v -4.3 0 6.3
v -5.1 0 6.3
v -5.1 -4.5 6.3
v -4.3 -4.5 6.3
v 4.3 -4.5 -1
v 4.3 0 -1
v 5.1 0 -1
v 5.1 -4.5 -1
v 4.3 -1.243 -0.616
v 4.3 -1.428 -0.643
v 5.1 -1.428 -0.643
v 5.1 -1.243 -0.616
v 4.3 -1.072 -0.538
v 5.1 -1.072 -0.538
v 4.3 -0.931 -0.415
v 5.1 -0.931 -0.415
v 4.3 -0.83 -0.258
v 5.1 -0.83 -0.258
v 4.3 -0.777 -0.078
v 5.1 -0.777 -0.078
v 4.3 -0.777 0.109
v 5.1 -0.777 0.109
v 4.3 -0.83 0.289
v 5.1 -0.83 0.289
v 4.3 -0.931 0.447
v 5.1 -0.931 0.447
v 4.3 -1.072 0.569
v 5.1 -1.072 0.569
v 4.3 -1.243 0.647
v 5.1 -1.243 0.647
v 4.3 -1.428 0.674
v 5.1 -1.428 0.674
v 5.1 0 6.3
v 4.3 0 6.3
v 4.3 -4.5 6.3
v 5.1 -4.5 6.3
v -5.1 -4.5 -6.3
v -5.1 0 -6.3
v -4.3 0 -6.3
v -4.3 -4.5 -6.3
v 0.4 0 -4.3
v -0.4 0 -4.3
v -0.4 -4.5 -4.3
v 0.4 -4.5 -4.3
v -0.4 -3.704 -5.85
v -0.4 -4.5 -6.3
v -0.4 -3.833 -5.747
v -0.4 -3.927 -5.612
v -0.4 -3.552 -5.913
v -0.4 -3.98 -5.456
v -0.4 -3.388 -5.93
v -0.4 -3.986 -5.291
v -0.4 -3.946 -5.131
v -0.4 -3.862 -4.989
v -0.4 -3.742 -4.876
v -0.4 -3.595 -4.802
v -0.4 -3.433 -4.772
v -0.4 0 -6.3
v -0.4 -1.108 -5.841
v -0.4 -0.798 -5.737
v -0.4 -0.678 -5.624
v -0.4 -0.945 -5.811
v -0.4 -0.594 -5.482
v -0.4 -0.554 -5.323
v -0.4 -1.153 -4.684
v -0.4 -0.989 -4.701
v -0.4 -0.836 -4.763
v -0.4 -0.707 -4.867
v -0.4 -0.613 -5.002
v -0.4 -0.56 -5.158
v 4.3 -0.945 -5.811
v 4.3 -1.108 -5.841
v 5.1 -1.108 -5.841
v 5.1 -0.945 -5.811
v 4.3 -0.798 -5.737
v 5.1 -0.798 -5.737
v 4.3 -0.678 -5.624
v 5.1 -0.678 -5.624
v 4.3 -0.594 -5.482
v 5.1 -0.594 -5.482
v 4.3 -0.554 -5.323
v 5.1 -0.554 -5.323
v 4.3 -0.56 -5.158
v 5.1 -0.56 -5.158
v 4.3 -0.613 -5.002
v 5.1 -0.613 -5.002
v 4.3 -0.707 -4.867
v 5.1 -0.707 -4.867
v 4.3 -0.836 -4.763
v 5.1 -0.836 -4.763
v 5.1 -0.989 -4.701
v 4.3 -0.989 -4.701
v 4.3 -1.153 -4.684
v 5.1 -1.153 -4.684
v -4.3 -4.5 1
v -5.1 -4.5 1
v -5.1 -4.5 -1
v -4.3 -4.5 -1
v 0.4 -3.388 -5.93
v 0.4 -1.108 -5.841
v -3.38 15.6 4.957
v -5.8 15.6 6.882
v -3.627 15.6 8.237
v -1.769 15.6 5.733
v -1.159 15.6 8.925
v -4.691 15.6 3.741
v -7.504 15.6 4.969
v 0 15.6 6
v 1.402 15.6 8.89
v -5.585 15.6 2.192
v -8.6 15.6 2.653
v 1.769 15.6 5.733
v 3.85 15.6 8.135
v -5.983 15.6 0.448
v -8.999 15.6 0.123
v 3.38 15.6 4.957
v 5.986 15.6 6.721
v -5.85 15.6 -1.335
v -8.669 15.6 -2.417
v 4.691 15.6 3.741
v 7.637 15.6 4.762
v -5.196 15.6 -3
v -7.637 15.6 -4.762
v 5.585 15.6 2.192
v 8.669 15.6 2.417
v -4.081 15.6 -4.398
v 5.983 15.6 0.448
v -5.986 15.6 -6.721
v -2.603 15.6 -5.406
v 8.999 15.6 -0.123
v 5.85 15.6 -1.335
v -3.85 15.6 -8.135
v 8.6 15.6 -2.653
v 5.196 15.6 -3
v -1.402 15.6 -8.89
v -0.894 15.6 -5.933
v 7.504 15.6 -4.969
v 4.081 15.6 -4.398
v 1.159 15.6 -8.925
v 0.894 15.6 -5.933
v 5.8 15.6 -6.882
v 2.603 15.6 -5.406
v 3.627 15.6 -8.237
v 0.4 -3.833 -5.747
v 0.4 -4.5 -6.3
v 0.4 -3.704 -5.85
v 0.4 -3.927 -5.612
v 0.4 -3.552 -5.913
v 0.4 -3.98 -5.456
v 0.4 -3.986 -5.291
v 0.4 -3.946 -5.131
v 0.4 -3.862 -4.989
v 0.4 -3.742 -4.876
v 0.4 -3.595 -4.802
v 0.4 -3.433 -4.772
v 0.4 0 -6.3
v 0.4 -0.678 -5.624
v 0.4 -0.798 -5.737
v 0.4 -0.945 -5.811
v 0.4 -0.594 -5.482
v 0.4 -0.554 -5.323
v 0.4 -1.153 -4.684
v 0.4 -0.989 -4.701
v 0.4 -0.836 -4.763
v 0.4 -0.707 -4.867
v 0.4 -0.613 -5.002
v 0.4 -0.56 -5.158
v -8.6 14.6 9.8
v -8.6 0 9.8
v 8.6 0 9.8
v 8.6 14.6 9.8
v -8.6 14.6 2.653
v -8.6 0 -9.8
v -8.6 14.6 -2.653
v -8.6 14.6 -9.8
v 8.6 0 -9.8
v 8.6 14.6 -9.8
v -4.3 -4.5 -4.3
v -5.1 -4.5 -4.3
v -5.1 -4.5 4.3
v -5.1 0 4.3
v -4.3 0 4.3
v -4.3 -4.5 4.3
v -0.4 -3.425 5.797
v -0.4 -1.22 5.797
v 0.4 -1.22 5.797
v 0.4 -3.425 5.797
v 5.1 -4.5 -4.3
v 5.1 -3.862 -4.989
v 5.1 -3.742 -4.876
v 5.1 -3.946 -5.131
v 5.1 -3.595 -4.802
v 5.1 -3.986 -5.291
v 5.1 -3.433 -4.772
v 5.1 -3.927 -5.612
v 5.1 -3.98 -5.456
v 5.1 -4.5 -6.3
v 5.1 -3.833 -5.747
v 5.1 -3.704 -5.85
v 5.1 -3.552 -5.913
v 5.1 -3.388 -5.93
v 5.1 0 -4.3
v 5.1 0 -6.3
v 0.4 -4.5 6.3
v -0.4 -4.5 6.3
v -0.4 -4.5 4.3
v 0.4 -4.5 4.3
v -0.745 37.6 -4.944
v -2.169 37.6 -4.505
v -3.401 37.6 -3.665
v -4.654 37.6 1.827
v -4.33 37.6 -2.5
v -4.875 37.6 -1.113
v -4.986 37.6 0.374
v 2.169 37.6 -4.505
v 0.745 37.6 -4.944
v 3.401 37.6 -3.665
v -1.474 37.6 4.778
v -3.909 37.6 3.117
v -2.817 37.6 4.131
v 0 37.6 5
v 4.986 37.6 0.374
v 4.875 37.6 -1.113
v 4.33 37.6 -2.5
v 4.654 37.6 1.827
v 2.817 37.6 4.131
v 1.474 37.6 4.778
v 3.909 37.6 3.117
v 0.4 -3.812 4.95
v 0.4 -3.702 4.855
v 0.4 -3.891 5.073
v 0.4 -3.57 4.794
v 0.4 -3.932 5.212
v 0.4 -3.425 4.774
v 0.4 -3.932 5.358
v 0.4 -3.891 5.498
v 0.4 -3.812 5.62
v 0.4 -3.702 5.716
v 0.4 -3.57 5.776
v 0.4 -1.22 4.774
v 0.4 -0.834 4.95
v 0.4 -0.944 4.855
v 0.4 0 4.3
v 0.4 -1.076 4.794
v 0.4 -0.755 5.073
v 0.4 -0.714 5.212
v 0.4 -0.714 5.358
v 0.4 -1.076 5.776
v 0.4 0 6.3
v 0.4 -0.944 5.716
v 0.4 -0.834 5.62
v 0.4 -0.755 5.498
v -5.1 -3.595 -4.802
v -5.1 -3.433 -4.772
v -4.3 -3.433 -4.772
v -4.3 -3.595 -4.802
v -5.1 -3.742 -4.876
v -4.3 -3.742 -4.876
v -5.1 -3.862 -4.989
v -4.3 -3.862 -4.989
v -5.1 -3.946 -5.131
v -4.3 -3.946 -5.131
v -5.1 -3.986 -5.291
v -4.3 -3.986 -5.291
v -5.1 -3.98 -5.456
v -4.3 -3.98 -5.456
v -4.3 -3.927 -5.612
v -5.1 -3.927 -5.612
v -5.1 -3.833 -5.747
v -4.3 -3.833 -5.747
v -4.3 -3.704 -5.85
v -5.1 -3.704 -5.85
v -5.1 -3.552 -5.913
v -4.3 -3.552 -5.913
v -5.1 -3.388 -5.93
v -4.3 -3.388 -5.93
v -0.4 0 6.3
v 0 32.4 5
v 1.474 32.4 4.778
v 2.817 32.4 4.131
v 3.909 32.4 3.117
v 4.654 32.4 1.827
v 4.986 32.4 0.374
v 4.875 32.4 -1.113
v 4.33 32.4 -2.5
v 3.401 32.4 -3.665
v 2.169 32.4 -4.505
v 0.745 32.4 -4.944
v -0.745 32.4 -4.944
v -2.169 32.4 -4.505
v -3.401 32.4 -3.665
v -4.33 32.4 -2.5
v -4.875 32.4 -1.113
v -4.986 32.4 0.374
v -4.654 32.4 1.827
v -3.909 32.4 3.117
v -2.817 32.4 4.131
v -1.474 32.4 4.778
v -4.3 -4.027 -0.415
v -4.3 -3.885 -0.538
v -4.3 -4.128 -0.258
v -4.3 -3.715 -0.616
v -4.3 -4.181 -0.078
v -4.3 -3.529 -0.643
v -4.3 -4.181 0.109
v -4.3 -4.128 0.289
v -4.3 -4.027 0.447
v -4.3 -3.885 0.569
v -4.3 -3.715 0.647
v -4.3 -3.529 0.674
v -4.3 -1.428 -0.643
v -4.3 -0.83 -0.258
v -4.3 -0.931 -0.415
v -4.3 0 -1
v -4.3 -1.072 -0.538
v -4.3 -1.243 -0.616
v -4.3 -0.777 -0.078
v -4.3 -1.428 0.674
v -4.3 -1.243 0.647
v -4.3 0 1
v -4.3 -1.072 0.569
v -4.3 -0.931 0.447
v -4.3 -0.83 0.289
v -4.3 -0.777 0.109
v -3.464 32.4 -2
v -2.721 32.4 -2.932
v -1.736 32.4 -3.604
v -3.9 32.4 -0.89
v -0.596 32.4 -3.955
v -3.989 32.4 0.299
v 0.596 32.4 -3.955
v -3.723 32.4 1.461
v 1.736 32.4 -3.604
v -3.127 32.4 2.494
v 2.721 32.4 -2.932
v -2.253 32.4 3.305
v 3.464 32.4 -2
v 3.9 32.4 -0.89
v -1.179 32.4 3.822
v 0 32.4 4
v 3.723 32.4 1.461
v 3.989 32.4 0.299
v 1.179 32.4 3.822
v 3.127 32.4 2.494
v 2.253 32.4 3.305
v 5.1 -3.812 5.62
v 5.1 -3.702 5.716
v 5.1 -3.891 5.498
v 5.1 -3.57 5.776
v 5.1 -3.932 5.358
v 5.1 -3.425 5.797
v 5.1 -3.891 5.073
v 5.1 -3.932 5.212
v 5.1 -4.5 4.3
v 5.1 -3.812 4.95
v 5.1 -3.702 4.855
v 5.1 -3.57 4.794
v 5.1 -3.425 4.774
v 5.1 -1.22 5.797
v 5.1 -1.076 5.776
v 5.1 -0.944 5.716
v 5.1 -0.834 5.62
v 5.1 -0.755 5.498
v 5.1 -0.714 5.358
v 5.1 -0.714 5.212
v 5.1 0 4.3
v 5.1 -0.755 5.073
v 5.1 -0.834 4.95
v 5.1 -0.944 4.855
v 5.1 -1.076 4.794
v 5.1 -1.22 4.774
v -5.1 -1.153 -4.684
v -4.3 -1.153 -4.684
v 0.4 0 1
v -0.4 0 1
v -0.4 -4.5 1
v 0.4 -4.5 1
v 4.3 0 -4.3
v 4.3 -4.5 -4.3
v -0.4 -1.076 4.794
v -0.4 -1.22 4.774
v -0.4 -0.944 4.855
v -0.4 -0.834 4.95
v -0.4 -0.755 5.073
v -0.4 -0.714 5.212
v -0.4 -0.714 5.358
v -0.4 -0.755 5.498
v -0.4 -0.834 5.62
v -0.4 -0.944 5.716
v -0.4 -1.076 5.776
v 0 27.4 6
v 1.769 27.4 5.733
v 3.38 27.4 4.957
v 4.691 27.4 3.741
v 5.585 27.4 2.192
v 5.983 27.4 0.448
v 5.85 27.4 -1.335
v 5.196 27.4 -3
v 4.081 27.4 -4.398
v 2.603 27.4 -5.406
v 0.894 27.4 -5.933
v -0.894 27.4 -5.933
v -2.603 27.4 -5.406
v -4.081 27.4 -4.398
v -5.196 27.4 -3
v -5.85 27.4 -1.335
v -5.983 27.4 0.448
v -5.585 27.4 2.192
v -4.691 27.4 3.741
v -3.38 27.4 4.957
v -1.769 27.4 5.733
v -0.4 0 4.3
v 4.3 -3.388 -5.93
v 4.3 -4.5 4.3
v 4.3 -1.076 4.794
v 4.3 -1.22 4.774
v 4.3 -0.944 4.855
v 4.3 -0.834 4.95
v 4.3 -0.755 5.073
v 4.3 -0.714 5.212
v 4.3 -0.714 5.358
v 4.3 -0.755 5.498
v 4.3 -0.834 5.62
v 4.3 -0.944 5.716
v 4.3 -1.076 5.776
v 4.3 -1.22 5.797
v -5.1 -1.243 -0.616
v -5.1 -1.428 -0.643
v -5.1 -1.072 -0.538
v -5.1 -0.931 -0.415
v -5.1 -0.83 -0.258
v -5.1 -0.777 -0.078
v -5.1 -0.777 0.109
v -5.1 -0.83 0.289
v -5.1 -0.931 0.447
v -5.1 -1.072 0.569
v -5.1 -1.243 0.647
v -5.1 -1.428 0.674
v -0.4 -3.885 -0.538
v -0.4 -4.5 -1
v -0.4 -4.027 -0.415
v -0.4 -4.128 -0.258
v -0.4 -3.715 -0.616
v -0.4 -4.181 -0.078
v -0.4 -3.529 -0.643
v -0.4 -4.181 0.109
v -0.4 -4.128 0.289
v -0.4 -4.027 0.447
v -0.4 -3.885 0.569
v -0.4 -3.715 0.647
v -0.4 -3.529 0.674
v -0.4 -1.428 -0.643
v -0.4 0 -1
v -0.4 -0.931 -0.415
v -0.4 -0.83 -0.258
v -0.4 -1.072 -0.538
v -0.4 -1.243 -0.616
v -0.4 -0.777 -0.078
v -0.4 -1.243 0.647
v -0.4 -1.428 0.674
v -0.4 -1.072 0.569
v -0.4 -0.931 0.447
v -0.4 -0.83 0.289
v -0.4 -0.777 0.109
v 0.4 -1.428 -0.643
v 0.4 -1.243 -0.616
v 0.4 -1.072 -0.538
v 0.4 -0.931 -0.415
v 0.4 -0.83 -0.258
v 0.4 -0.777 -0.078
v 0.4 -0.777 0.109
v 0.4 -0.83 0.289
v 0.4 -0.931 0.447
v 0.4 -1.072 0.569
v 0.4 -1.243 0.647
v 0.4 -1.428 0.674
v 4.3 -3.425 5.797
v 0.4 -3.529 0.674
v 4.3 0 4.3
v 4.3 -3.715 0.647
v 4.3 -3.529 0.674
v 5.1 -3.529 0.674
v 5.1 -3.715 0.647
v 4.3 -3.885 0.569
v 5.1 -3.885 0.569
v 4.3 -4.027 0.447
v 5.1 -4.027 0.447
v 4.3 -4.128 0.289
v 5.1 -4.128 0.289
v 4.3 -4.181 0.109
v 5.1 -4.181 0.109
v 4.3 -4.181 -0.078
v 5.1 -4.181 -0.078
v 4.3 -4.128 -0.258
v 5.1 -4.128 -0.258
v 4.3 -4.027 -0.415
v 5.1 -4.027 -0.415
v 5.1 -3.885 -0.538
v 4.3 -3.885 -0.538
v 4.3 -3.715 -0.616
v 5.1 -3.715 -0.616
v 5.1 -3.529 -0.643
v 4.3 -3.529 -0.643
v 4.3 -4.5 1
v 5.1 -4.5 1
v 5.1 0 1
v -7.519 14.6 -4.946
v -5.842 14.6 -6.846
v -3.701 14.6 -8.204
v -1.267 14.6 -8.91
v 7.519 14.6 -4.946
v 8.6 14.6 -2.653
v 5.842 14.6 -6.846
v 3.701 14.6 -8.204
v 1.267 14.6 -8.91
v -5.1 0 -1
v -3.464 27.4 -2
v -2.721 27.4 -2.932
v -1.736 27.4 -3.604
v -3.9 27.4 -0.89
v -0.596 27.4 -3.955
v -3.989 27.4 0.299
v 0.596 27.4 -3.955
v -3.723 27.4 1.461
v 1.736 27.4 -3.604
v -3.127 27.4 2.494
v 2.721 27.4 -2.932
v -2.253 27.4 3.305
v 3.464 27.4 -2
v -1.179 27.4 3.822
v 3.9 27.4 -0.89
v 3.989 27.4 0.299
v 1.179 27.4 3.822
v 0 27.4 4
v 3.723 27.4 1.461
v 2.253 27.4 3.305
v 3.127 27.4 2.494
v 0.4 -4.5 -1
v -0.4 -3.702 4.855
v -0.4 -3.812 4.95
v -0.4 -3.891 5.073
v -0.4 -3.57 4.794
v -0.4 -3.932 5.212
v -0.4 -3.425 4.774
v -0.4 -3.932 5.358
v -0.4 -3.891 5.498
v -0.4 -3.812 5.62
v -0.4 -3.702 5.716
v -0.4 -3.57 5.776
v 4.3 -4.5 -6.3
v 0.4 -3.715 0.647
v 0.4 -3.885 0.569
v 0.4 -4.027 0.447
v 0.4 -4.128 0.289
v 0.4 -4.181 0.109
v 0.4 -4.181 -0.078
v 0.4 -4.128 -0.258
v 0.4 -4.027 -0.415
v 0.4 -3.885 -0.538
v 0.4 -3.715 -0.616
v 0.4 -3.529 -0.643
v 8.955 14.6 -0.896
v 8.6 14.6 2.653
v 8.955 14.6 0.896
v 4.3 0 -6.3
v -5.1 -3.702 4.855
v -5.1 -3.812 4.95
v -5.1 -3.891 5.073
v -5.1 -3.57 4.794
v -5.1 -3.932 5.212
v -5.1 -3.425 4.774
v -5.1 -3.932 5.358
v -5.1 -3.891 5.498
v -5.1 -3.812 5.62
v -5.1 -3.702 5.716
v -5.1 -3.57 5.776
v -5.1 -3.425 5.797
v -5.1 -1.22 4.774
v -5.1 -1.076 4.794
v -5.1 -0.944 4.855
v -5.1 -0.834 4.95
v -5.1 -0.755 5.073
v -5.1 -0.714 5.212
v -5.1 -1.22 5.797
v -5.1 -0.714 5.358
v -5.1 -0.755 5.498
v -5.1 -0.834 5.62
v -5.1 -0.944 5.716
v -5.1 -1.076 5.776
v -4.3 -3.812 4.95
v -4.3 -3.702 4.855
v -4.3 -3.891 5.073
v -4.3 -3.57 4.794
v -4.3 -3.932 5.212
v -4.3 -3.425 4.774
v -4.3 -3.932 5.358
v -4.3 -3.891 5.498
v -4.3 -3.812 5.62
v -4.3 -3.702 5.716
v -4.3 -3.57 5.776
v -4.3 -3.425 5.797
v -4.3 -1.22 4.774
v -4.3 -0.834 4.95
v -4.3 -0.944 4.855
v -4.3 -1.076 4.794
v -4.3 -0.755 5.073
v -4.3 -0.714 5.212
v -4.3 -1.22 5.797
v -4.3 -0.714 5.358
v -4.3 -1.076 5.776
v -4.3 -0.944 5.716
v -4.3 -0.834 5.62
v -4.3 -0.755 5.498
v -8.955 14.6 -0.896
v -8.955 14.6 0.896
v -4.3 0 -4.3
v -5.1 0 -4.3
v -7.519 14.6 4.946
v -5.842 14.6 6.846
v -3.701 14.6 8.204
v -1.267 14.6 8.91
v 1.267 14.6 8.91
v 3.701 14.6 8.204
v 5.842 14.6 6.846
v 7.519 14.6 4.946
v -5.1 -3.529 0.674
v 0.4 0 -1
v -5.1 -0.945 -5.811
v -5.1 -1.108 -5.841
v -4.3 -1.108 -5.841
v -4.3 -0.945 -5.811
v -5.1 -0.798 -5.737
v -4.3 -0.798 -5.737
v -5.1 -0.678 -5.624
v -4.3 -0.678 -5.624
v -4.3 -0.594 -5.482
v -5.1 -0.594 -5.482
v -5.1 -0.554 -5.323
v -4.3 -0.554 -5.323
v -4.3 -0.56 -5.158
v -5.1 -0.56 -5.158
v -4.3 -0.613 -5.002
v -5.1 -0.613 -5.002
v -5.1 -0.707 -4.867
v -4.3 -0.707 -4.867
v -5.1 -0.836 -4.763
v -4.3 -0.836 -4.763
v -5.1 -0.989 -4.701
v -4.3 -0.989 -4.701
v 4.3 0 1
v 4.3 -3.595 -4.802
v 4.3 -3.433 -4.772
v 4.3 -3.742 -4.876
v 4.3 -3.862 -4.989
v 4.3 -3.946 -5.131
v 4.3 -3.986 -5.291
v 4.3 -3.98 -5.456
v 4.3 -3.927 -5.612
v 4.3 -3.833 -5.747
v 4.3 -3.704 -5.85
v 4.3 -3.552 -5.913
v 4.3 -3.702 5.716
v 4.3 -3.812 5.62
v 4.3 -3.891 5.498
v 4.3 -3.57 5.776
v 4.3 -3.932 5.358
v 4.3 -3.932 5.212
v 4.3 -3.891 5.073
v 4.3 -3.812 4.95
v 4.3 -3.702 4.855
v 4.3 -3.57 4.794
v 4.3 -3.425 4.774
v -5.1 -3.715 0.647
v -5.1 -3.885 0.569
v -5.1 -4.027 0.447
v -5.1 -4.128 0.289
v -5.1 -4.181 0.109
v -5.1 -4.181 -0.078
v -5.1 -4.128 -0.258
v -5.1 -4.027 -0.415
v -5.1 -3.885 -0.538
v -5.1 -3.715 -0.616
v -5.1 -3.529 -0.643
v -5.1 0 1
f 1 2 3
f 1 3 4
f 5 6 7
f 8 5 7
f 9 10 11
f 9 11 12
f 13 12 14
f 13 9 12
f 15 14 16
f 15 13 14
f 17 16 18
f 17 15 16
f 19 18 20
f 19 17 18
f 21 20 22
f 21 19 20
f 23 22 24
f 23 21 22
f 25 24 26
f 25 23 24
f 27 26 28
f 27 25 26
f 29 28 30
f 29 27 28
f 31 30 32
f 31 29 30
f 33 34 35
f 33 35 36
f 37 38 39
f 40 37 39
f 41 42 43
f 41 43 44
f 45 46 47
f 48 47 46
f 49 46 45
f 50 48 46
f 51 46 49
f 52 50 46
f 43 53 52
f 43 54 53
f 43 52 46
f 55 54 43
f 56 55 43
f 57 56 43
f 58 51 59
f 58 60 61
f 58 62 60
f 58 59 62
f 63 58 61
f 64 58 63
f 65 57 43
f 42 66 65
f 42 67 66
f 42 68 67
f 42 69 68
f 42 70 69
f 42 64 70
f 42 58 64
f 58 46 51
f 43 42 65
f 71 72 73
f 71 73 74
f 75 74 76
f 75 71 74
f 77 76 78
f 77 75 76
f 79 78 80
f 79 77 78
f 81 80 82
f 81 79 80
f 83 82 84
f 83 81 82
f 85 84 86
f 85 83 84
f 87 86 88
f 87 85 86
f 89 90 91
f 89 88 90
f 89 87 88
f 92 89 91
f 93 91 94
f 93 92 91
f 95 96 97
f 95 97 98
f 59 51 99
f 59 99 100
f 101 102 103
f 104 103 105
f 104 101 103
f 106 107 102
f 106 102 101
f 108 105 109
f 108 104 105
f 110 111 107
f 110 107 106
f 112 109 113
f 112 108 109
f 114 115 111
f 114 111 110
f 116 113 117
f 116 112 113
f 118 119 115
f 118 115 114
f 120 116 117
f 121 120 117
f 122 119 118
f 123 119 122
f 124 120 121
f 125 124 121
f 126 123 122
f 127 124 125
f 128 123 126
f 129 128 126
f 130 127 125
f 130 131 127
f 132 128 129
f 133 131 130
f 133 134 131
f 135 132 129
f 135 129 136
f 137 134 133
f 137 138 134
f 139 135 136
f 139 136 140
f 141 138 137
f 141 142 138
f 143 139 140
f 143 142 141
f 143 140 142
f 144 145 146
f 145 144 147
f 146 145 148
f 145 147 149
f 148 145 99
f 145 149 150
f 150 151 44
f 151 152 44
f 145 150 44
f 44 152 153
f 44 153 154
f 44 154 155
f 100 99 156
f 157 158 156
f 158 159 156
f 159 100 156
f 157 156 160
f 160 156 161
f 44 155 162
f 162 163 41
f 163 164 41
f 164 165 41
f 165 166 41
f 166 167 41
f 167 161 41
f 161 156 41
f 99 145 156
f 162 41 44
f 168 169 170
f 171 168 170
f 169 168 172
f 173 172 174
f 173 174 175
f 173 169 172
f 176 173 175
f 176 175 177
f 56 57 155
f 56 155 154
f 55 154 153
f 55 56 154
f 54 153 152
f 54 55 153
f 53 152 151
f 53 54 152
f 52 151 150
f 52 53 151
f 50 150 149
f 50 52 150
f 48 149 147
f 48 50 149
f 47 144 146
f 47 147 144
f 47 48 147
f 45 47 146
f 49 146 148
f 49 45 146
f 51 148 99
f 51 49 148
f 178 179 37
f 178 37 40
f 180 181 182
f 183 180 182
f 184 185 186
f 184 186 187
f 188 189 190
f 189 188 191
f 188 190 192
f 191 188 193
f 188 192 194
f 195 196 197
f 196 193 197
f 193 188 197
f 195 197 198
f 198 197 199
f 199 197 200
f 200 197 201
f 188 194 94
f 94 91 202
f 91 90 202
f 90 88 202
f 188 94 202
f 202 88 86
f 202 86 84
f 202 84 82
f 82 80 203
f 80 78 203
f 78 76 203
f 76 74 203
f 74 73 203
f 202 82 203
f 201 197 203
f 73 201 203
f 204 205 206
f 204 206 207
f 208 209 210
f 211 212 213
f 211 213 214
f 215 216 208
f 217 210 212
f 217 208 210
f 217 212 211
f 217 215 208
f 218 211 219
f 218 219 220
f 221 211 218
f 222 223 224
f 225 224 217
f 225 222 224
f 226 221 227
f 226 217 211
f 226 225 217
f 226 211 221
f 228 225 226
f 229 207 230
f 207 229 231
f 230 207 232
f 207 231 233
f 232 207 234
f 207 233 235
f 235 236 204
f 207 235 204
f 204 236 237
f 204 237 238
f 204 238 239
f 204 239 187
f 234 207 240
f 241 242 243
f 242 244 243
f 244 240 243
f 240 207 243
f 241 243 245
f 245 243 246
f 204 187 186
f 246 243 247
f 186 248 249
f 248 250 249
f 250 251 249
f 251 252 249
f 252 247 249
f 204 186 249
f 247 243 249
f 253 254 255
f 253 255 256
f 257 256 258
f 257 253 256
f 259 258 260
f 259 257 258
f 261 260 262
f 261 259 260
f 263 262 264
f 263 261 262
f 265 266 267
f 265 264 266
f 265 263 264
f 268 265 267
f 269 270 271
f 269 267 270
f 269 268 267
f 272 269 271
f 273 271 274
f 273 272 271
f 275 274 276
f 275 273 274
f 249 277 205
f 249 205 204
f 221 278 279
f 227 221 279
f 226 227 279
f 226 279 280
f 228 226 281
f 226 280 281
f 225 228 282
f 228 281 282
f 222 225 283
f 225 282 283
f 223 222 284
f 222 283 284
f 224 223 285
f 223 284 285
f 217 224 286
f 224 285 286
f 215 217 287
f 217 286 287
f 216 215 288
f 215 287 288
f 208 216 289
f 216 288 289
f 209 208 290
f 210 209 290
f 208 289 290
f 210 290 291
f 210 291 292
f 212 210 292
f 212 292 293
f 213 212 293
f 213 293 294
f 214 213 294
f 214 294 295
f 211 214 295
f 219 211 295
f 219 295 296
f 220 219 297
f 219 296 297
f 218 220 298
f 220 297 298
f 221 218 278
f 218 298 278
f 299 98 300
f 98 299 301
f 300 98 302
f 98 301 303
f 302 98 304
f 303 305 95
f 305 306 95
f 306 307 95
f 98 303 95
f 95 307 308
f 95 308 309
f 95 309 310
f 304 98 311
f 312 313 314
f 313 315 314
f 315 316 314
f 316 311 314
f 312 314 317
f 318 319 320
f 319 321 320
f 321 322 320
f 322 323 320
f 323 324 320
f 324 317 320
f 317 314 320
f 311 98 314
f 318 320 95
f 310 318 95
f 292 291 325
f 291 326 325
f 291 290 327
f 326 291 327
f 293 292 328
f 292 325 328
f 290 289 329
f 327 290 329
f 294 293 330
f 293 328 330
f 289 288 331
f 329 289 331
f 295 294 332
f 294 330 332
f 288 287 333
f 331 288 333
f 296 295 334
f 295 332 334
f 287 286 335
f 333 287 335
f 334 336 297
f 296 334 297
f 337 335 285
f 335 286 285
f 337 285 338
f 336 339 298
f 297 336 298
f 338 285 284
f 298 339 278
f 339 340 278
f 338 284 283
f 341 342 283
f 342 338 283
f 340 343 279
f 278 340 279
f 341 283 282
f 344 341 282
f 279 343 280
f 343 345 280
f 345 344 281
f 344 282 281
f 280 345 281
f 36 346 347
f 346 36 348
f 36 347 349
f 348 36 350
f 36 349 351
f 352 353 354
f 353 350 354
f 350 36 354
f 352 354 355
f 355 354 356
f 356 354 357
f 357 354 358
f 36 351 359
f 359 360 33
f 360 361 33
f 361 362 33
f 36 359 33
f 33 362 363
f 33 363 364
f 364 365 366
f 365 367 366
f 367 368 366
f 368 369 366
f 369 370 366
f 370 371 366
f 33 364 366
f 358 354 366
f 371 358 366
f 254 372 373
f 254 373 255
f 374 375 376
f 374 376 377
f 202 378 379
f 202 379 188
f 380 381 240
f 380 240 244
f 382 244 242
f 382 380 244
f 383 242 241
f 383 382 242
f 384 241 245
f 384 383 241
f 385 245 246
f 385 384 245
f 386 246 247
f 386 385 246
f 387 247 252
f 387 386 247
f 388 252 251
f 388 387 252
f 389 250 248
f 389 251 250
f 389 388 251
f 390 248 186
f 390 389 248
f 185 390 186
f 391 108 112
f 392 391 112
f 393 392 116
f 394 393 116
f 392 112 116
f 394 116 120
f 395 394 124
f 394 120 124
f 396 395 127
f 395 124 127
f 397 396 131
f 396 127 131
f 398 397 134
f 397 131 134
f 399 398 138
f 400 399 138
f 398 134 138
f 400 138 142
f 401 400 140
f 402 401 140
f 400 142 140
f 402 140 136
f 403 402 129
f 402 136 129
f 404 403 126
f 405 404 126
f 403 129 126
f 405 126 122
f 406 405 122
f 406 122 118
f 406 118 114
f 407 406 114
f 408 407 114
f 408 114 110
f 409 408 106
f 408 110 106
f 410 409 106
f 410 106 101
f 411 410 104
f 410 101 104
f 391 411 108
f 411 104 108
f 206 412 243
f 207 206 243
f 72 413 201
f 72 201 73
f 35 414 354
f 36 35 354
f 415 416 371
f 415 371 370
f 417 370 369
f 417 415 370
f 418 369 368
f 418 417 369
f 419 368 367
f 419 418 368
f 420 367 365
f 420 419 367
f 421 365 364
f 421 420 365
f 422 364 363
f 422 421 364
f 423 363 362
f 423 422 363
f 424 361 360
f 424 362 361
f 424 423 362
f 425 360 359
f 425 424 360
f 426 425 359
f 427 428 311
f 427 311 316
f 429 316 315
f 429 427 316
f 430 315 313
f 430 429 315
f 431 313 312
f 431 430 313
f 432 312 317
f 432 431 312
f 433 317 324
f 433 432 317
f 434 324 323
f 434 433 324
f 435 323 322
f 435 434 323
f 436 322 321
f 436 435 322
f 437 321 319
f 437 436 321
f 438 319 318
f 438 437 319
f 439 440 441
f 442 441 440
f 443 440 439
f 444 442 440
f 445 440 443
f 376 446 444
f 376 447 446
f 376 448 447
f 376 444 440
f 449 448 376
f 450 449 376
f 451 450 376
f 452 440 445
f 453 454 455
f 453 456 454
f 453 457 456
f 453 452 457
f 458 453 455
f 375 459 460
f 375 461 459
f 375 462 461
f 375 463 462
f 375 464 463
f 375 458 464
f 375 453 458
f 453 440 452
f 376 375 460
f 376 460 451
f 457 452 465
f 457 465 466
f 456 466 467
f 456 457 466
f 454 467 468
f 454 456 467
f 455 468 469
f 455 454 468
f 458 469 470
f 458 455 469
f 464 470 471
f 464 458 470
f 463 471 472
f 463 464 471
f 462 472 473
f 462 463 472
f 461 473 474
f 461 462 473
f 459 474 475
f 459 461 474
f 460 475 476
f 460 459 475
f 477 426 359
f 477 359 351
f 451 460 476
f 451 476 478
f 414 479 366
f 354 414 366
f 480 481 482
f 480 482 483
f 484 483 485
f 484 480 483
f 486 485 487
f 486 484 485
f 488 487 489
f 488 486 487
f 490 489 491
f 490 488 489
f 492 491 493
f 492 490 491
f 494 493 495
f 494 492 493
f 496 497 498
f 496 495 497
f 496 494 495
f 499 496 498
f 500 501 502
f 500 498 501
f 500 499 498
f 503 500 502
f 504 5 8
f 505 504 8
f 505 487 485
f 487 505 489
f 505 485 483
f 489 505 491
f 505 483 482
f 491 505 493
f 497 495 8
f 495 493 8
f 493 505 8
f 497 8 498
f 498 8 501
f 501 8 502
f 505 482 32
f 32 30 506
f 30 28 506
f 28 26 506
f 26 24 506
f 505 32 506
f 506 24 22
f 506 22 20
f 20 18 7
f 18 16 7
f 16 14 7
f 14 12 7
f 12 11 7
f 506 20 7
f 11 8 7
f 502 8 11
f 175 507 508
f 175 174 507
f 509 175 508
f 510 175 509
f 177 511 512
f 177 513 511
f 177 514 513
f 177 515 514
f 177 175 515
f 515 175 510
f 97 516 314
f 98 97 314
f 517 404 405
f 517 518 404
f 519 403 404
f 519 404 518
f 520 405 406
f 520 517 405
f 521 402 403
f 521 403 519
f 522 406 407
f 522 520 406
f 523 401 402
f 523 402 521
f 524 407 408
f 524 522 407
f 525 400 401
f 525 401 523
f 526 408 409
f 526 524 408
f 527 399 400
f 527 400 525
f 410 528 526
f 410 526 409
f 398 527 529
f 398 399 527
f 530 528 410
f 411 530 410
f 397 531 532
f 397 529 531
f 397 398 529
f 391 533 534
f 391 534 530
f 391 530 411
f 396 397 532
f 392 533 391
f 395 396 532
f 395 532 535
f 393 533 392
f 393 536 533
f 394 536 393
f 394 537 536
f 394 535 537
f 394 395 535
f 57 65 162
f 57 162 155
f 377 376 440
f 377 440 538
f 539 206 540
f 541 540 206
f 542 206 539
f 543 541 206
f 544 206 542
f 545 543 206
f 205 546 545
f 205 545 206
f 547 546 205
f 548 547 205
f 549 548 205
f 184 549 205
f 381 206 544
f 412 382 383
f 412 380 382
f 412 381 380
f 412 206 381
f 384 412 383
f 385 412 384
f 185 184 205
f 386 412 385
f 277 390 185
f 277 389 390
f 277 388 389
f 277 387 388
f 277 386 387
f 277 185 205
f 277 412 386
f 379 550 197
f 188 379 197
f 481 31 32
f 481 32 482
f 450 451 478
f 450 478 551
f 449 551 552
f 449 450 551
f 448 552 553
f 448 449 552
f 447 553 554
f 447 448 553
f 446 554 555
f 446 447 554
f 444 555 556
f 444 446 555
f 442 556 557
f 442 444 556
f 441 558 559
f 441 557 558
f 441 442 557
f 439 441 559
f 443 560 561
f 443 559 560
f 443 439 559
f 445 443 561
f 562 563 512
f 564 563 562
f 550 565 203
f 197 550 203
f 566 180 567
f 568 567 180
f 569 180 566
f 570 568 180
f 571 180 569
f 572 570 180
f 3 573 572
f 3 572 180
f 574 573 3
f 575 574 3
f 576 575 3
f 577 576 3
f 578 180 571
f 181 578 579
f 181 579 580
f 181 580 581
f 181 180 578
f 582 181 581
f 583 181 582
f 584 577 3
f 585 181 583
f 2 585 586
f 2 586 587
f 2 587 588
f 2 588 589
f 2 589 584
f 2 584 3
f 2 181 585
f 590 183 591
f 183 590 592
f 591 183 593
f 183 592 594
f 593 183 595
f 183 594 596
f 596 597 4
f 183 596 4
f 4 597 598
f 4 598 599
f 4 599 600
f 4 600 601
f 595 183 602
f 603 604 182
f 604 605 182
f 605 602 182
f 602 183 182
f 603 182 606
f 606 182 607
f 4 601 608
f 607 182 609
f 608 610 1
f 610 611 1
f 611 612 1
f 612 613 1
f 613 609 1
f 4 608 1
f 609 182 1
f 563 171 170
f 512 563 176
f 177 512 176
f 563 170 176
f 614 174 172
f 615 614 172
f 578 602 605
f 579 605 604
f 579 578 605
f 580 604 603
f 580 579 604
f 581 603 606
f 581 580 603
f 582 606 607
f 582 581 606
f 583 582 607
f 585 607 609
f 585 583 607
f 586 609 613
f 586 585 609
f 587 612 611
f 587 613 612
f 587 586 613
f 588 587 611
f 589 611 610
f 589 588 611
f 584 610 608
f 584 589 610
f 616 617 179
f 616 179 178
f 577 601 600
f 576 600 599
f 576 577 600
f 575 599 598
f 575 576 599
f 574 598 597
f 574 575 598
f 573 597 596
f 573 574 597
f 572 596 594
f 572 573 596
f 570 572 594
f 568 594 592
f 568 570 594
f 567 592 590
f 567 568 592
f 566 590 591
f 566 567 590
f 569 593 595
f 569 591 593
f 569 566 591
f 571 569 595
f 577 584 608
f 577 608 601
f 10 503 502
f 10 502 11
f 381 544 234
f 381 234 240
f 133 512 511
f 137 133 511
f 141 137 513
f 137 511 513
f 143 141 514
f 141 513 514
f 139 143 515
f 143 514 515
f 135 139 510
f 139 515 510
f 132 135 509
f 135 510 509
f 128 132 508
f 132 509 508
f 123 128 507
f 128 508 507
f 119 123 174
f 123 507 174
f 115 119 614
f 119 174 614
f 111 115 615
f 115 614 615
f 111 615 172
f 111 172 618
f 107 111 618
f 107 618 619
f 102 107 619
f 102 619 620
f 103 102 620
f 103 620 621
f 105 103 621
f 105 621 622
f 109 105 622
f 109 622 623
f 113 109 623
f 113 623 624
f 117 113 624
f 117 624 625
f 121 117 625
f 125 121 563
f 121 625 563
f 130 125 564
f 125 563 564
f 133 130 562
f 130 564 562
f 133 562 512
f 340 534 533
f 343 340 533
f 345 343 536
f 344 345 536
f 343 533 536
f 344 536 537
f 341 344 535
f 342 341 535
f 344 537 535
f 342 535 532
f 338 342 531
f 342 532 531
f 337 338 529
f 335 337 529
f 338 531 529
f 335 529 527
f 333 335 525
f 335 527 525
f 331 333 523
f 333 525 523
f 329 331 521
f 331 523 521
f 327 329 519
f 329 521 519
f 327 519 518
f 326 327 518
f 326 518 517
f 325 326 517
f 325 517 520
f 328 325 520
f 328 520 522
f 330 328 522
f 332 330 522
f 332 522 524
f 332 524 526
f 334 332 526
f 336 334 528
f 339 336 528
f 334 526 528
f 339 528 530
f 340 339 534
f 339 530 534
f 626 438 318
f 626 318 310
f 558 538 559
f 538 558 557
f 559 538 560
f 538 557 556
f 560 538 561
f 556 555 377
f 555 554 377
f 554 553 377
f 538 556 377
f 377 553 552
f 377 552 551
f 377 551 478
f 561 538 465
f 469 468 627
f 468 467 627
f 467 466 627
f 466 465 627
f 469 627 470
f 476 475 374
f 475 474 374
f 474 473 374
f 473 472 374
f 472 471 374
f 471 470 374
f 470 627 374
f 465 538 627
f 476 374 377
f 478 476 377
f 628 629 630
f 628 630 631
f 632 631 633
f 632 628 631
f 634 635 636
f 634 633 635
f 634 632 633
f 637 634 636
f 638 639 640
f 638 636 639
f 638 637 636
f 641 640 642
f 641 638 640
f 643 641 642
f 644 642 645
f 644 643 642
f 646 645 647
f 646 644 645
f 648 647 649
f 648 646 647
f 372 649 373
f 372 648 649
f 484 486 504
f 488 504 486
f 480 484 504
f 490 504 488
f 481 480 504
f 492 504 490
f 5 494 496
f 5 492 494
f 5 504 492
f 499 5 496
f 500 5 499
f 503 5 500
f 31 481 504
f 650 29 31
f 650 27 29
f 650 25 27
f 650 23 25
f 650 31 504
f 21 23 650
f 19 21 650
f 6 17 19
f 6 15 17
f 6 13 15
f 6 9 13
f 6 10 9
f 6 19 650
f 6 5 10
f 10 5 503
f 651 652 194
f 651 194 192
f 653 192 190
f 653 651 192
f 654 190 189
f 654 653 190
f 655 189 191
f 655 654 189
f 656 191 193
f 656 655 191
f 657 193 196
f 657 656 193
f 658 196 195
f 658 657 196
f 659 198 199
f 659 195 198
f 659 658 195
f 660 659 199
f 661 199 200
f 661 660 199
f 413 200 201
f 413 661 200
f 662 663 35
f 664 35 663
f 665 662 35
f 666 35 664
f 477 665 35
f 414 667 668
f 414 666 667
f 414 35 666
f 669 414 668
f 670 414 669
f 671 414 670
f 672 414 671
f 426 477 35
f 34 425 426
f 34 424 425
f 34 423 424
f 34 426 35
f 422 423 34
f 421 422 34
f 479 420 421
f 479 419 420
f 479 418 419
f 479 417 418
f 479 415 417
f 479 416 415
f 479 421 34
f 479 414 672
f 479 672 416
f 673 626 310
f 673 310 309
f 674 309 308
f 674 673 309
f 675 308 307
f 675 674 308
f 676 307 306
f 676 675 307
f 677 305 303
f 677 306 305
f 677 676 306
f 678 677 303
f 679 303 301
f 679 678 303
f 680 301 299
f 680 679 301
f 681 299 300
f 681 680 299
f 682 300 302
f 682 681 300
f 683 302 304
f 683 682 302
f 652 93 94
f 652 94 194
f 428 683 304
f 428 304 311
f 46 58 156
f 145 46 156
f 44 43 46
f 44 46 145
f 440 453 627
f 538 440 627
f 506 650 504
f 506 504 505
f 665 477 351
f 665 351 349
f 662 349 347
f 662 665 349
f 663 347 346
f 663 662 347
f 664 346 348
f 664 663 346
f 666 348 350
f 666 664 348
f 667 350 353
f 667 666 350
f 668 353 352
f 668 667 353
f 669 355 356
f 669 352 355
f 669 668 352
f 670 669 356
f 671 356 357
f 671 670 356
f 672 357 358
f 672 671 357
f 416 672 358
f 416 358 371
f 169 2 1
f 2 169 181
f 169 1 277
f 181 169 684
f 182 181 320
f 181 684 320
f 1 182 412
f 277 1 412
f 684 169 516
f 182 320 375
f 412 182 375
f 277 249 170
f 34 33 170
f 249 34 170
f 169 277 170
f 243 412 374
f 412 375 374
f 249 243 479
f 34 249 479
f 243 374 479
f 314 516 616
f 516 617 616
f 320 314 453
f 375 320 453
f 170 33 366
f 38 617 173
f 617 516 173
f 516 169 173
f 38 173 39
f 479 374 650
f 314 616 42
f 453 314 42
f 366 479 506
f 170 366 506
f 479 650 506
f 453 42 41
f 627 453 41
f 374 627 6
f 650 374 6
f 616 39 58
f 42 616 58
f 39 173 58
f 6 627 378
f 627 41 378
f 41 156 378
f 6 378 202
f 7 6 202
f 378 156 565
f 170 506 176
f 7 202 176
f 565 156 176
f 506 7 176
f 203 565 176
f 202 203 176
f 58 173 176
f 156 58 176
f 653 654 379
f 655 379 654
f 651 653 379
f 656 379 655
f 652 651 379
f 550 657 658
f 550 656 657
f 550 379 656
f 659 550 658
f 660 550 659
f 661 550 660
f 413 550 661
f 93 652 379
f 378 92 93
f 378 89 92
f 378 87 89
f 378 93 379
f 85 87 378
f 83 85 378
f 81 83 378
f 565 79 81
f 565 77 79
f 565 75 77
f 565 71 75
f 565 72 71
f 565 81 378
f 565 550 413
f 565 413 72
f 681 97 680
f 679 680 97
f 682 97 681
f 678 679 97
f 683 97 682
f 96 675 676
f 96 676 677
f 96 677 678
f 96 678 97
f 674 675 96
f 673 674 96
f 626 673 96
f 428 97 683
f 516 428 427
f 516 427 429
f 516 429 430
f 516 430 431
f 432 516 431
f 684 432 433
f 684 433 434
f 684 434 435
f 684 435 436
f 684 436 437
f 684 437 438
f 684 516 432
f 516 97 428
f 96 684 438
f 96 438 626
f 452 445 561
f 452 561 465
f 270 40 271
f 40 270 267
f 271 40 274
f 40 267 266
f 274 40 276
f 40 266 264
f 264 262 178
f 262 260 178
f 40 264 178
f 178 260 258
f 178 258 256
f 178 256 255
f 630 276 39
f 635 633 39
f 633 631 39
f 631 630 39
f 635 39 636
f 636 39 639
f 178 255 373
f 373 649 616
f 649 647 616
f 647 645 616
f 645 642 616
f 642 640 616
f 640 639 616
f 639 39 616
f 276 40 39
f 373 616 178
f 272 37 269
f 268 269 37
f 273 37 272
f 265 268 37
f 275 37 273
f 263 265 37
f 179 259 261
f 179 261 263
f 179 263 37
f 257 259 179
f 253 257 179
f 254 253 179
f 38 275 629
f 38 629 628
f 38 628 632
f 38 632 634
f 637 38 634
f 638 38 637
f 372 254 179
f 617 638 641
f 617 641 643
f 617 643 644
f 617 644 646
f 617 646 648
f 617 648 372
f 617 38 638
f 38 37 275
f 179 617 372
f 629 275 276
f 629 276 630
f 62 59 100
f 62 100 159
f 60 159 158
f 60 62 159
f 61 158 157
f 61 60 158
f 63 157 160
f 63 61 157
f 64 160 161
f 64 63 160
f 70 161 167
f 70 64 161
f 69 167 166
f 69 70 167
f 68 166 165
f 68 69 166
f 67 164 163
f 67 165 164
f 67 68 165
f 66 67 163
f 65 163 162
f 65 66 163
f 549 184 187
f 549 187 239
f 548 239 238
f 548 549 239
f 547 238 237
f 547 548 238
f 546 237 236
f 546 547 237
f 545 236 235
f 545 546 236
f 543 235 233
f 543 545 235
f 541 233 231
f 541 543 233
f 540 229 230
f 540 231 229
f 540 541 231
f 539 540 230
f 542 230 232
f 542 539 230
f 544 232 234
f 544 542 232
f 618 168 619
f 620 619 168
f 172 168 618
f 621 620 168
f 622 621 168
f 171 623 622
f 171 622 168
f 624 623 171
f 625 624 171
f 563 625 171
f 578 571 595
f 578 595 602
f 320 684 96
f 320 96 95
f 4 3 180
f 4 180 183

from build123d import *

# Parameters (mm, degrees)
SKETCH_1_W                       = 17.2
SKETCH_1_H                       = 19.6
EXTRUDE_1_DEPTH                  = 14.6
SKETCH_2_R                       = 9
EXTRUDE_2_DEPTH                  = 1
SKETCH_3_R                       = 6
EXTRUDE_3_DEPTH                  = 11.8
SKETCH_4_R                       = 4
EXTRUDE_4_DEPTH                  = 5
SKETCH_5_R                       = 5
EXTRUDE_5_DEPTH                  = 5.2
SKETCH_6_W                       = 0.8
SKETCH_6_H                       = 2
EXTRUDE_6_DEPTH                  = 4.5
PATTERN_LINEAR_1_COUNT           = 2
PATTERN_LINEAR_1_PITCH           = 5.3
PATTERN_LINEAR_2_COUNT           = 2
PATTERN_LINEAR_2_PITCH           = 4.7
PATTERN_LINEAR_2_COPY_1_SKETCH_W = 0.8
PATTERN_LINEAR_2_COPY_1_SKETCH_H = 2
PATTERN_LINEAR_2_COPY_1_DEPTH    = 4.5
PATTERN_LINEAR_3_COUNT           = 2
PATTERN_LINEAR_3_PITCH           = 5.3
PATTERN_LINEAR_3_COPY_1_SKETCH_W = 0.8
PATTERN_LINEAR_3_COPY_1_SKETCH_H = 2
PATTERN_LINEAR_3_COPY_1_DEPTH    = 4.5
PATTERN_LINEAR_3_COPY_2_SKETCH_W = 0.8
PATTERN_LINEAR_3_COPY_2_SKETCH_H = 2
PATTERN_LINEAR_3_COPY_2_DEPTH    = 4.5
PATTERN_LINEAR_3_COPY_3_SKETCH_W = 0.8
PATTERN_LINEAR_3_COPY_3_SKETCH_H = 2
PATTERN_LINEAR_3_COPY_3_DEPTH    = 4.5
PATTERN_START                    = -6.3
PATTERN_LINEAR_4_OUTLINE_W       = 0.8
PATTERN_LINEAR_4_OUTLINE_H       = 4.5
PATTERN_LINEAR_4_DEPTH           = 2
PATTERN_START_2                  = -1
PATTERN_LINEAR_4_2_OUTLINE_W     = 0.8
PATTERN_LINEAR_4_2_OUTLINE_H     = 4.5
PATTERN_LINEAR_4_2_DEPTH         = 2
PATTERN_START_3                  = 4.3
PATTERN_LINEAR_4_3_OUTLINE_W     = 0.8
PATTERN_LINEAR_4_3_OUTLINE_H     = 4.5
PATTERN_LINEAR_4_3_DEPTH         = 2
CUT_EXTRUDE_1_DEPTH              = 42.335335973


# Read off the part's stored shape, not the designer's step: 阵列(线性)4
with BuildPart() as part:
    # 草图1 → 凸台-拉伸1 (new body)
    with BuildSketch(Plane(origin=(0, 0, 0), x_dir=(1, 0, 0), z_dir=(0, 1, 0))):
        Rectangle(SKETCH_1_W, SKETCH_1_H)
    extrude(amount=EXTRUDE_1_DEPTH)

    # 草图2 → 凸台-拉伸2 (add)
    with BuildSketch(Plane(origin=(0, 14.6, 0), x_dir=(1, 0, 0), z_dir=(0, 1, 0))):
        with Locations(Location((0, 0, 0), (0, 0, 17.146209999))):
            Circle(SKETCH_2_R)
    extrude(amount=EXTRUDE_2_DEPTH)

    # 草图3 → 凸台-拉伸3 (add)
    with BuildSketch(Plane(origin=(0, 15.6, 0), x_dir=(1, 0, 0), z_dir=(0, 1, 0))):
        with Locations(Location((0, 0, 0), (0, 0, 270))):
            Circle(SKETCH_3_R)
    extrude(amount=EXTRUDE_3_DEPTH)

    # 草图4 → 凸台-拉伸4 (add)
    with BuildSketch(Plane(origin=(0, 27.4, 0), x_dir=(1, 0, 0), z_dir=(0, 1, 0))):
        with Locations(Location((0, 0, 0), (0, 0, 270))):
            Circle(SKETCH_4_R)
    extrude(amount=EXTRUDE_4_DEPTH)

    # 草图5 → 凸台-拉伸5 (add)
    with BuildSketch(Plane(origin=(0, 32.4, 0), x_dir=(1, 0, 0), z_dir=(0, 1, 0))):
        with Locations(Location((0, 0, 0), (0, 0, 270))):
            Circle(SKETCH_5_R)
    extrude(amount=EXTRUDE_5_DEPTH)

    # 草图6 → 凸台-拉伸6 (add)
    with BuildSketch(Plane.XZ):
        Rectangle(SKETCH_6_W, SKETCH_6_H)
    extrude_6 = extrude(amount=EXTRUDE_6_DEPTH)

    # 阵列(线性)1: 凸台-拉伸6 ×2
    with Locations(*[(0, 0, i * PATTERN_LINEAR_1_PITCH) for i in range(1, PATTERN_LINEAR_1_COUNT)]):
        add(extrude_6)

    # 阵列(线性)2: 凸台-拉伸6 ×2
    with Locations(*[(-i * PATTERN_LINEAR_2_PITCH, 0, 0) for i in range(1, PATTERN_LINEAR_2_COUNT)]):
        add(extrude_6)

    # 阵列(线性)2 copy 1 sketch → 阵列(线性)2 copy 1 (add)
    with BuildSketch(Plane(origin=(-4.7, 0, 5.3), x_dir=(1, 0, 0), z_dir=(0, -1, 0))):
        Rectangle(PATTERN_LINEAR_2_COPY_1_SKETCH_W, PATTERN_LINEAR_2_COPY_1_SKETCH_H)
    extrude(amount=PATTERN_LINEAR_2_COPY_1_DEPTH)

    # 阵列(线性)3: 凸台-拉伸6 ×2
    with Locations(*[(0, 0, -i * PATTERN_LINEAR_3_PITCH) for i in range(1, PATTERN_LINEAR_3_COUNT)]):
        add(extrude_6)

    # 阵列(线性)3 copy 1 sketch → 阵列(线性)3 copy 1 (add)
    with BuildSketch(Plane.XZ):
        Rectangle(PATTERN_LINEAR_3_COPY_1_SKETCH_W, PATTERN_LINEAR_3_COPY_1_SKETCH_H)
    extrude(amount=PATTERN_LINEAR_3_COPY_1_DEPTH)

    # 阵列(线性)3 copy 2 sketch → 阵列(线性)3 copy 2 (add)
    with BuildSketch(Plane(origin=(-4.7, 0, -5.3), x_dir=(1, 0, 0), z_dir=(0, -1, 0))):
        Rectangle(PATTERN_LINEAR_3_COPY_2_SKETCH_W, PATTERN_LINEAR_3_COPY_2_SKETCH_H)
    extrude(amount=PATTERN_LINEAR_3_COPY_2_DEPTH)

    # 阵列(线性)3 copy 3 sketch → 阵列(线性)3 copy 3 (add)
    with BuildSketch(Plane(origin=(-4.7, 0, 0), x_dir=(1, 0, 0), z_dir=(0, -1, 0))):
        Rectangle(PATTERN_LINEAR_3_COPY_3_SKETCH_W, PATTERN_LINEAR_3_COPY_3_SKETCH_H)
    extrude(amount=PATTERN_LINEAR_3_COPY_3_DEPTH)

    # 阵列(线性)4 outline → 阵列(线性)4 (add)
    with BuildSketch(Plane.XY.offset(PATTERN_START)):
        with Locations((4.7, -2.25)):
            Rectangle(PATTERN_LINEAR_4_OUTLINE_W, PATTERN_LINEAR_4_OUTLINE_H)
    extrude(amount=PATTERN_LINEAR_4_DEPTH)

    # Pattern Linear 4 2 outline → Pattern Linear 4 2 (add)
    with BuildSketch(Plane.XY.offset(PATTERN_START_2)):
        with Locations((4.7, -2.25)):
            Rectangle(PATTERN_LINEAR_4_2_OUTLINE_W, PATTERN_LINEAR_4_2_OUTLINE_H)
    extrude(amount=PATTERN_LINEAR_4_2_DEPTH)

    # Pattern Linear 4 3 outline → Pattern Linear 4 3 (add)
    with BuildSketch(Plane.XY.offset(PATTERN_START_3)):
        with Locations((4.7, -2.25)):
            Rectangle(PATTERN_LINEAR_4_3_OUTLINE_W, PATTERN_LINEAR_4_3_OUTLINE_H)
    extrude(amount=PATTERN_LINEAR_4_3_DEPTH)

    # 草图7 → 切除-拉伸1 (cut, through all)
    with BuildSketch(Plane.ZY.offset(5.1)):
        with BuildLine():
            Line((-0.642660902, -3.529284683), (-0.642660902, -1.428383643))
            ThreePointArc((-0.642660902, -1.428383643), (0.015637107, -0.770085634), (0.673935116, -1.428383643))
            Line((0.673935116, -1.428383643), (0.673935116, -3.529284683))
            ThreePointArc((0.673935116, -3.529284683), (0.015637107, -4.187582692), (-0.642660902, -3.529284683))
        make_face()
        with BuildLine():
            Line((-5.929653449, -3.387727592), (-5.841132285, -1.107614892))
            ThreePointArc((-5.841132285, -1.107614892), (-5.239978984, -0.551394487), (-4.683758579, -1.152547788))
            Line((-4.683758579, -1.152547788), (-4.772279743, -3.432660488))
            ThreePointArc((-4.772279743, -3.432660488), (-5.373433044, -3.988880894), (-5.929653449, -3.387727592))
        make_face()
        with BuildLine():
            Line((4.773595849, -3.425492164), (4.773595849, -1.220322784))
            ThreePointArc((4.773595849, -1.220322784), (5.285264786, -0.708653848), (5.796933722, -1.220322784))
            Line((5.796933722, -1.220322784), (5.796933722, -3.425492164))
            ThreePointArc((5.796933722, -3.425492164), (5.285264786, -3.937161101), (4.773595849, -3.425492164))
        make_face()
    extrude(amount=-CUT_EXTRUDE_1_DEPTH, mode=Mode.SUBTRACT)


solid = part.part
